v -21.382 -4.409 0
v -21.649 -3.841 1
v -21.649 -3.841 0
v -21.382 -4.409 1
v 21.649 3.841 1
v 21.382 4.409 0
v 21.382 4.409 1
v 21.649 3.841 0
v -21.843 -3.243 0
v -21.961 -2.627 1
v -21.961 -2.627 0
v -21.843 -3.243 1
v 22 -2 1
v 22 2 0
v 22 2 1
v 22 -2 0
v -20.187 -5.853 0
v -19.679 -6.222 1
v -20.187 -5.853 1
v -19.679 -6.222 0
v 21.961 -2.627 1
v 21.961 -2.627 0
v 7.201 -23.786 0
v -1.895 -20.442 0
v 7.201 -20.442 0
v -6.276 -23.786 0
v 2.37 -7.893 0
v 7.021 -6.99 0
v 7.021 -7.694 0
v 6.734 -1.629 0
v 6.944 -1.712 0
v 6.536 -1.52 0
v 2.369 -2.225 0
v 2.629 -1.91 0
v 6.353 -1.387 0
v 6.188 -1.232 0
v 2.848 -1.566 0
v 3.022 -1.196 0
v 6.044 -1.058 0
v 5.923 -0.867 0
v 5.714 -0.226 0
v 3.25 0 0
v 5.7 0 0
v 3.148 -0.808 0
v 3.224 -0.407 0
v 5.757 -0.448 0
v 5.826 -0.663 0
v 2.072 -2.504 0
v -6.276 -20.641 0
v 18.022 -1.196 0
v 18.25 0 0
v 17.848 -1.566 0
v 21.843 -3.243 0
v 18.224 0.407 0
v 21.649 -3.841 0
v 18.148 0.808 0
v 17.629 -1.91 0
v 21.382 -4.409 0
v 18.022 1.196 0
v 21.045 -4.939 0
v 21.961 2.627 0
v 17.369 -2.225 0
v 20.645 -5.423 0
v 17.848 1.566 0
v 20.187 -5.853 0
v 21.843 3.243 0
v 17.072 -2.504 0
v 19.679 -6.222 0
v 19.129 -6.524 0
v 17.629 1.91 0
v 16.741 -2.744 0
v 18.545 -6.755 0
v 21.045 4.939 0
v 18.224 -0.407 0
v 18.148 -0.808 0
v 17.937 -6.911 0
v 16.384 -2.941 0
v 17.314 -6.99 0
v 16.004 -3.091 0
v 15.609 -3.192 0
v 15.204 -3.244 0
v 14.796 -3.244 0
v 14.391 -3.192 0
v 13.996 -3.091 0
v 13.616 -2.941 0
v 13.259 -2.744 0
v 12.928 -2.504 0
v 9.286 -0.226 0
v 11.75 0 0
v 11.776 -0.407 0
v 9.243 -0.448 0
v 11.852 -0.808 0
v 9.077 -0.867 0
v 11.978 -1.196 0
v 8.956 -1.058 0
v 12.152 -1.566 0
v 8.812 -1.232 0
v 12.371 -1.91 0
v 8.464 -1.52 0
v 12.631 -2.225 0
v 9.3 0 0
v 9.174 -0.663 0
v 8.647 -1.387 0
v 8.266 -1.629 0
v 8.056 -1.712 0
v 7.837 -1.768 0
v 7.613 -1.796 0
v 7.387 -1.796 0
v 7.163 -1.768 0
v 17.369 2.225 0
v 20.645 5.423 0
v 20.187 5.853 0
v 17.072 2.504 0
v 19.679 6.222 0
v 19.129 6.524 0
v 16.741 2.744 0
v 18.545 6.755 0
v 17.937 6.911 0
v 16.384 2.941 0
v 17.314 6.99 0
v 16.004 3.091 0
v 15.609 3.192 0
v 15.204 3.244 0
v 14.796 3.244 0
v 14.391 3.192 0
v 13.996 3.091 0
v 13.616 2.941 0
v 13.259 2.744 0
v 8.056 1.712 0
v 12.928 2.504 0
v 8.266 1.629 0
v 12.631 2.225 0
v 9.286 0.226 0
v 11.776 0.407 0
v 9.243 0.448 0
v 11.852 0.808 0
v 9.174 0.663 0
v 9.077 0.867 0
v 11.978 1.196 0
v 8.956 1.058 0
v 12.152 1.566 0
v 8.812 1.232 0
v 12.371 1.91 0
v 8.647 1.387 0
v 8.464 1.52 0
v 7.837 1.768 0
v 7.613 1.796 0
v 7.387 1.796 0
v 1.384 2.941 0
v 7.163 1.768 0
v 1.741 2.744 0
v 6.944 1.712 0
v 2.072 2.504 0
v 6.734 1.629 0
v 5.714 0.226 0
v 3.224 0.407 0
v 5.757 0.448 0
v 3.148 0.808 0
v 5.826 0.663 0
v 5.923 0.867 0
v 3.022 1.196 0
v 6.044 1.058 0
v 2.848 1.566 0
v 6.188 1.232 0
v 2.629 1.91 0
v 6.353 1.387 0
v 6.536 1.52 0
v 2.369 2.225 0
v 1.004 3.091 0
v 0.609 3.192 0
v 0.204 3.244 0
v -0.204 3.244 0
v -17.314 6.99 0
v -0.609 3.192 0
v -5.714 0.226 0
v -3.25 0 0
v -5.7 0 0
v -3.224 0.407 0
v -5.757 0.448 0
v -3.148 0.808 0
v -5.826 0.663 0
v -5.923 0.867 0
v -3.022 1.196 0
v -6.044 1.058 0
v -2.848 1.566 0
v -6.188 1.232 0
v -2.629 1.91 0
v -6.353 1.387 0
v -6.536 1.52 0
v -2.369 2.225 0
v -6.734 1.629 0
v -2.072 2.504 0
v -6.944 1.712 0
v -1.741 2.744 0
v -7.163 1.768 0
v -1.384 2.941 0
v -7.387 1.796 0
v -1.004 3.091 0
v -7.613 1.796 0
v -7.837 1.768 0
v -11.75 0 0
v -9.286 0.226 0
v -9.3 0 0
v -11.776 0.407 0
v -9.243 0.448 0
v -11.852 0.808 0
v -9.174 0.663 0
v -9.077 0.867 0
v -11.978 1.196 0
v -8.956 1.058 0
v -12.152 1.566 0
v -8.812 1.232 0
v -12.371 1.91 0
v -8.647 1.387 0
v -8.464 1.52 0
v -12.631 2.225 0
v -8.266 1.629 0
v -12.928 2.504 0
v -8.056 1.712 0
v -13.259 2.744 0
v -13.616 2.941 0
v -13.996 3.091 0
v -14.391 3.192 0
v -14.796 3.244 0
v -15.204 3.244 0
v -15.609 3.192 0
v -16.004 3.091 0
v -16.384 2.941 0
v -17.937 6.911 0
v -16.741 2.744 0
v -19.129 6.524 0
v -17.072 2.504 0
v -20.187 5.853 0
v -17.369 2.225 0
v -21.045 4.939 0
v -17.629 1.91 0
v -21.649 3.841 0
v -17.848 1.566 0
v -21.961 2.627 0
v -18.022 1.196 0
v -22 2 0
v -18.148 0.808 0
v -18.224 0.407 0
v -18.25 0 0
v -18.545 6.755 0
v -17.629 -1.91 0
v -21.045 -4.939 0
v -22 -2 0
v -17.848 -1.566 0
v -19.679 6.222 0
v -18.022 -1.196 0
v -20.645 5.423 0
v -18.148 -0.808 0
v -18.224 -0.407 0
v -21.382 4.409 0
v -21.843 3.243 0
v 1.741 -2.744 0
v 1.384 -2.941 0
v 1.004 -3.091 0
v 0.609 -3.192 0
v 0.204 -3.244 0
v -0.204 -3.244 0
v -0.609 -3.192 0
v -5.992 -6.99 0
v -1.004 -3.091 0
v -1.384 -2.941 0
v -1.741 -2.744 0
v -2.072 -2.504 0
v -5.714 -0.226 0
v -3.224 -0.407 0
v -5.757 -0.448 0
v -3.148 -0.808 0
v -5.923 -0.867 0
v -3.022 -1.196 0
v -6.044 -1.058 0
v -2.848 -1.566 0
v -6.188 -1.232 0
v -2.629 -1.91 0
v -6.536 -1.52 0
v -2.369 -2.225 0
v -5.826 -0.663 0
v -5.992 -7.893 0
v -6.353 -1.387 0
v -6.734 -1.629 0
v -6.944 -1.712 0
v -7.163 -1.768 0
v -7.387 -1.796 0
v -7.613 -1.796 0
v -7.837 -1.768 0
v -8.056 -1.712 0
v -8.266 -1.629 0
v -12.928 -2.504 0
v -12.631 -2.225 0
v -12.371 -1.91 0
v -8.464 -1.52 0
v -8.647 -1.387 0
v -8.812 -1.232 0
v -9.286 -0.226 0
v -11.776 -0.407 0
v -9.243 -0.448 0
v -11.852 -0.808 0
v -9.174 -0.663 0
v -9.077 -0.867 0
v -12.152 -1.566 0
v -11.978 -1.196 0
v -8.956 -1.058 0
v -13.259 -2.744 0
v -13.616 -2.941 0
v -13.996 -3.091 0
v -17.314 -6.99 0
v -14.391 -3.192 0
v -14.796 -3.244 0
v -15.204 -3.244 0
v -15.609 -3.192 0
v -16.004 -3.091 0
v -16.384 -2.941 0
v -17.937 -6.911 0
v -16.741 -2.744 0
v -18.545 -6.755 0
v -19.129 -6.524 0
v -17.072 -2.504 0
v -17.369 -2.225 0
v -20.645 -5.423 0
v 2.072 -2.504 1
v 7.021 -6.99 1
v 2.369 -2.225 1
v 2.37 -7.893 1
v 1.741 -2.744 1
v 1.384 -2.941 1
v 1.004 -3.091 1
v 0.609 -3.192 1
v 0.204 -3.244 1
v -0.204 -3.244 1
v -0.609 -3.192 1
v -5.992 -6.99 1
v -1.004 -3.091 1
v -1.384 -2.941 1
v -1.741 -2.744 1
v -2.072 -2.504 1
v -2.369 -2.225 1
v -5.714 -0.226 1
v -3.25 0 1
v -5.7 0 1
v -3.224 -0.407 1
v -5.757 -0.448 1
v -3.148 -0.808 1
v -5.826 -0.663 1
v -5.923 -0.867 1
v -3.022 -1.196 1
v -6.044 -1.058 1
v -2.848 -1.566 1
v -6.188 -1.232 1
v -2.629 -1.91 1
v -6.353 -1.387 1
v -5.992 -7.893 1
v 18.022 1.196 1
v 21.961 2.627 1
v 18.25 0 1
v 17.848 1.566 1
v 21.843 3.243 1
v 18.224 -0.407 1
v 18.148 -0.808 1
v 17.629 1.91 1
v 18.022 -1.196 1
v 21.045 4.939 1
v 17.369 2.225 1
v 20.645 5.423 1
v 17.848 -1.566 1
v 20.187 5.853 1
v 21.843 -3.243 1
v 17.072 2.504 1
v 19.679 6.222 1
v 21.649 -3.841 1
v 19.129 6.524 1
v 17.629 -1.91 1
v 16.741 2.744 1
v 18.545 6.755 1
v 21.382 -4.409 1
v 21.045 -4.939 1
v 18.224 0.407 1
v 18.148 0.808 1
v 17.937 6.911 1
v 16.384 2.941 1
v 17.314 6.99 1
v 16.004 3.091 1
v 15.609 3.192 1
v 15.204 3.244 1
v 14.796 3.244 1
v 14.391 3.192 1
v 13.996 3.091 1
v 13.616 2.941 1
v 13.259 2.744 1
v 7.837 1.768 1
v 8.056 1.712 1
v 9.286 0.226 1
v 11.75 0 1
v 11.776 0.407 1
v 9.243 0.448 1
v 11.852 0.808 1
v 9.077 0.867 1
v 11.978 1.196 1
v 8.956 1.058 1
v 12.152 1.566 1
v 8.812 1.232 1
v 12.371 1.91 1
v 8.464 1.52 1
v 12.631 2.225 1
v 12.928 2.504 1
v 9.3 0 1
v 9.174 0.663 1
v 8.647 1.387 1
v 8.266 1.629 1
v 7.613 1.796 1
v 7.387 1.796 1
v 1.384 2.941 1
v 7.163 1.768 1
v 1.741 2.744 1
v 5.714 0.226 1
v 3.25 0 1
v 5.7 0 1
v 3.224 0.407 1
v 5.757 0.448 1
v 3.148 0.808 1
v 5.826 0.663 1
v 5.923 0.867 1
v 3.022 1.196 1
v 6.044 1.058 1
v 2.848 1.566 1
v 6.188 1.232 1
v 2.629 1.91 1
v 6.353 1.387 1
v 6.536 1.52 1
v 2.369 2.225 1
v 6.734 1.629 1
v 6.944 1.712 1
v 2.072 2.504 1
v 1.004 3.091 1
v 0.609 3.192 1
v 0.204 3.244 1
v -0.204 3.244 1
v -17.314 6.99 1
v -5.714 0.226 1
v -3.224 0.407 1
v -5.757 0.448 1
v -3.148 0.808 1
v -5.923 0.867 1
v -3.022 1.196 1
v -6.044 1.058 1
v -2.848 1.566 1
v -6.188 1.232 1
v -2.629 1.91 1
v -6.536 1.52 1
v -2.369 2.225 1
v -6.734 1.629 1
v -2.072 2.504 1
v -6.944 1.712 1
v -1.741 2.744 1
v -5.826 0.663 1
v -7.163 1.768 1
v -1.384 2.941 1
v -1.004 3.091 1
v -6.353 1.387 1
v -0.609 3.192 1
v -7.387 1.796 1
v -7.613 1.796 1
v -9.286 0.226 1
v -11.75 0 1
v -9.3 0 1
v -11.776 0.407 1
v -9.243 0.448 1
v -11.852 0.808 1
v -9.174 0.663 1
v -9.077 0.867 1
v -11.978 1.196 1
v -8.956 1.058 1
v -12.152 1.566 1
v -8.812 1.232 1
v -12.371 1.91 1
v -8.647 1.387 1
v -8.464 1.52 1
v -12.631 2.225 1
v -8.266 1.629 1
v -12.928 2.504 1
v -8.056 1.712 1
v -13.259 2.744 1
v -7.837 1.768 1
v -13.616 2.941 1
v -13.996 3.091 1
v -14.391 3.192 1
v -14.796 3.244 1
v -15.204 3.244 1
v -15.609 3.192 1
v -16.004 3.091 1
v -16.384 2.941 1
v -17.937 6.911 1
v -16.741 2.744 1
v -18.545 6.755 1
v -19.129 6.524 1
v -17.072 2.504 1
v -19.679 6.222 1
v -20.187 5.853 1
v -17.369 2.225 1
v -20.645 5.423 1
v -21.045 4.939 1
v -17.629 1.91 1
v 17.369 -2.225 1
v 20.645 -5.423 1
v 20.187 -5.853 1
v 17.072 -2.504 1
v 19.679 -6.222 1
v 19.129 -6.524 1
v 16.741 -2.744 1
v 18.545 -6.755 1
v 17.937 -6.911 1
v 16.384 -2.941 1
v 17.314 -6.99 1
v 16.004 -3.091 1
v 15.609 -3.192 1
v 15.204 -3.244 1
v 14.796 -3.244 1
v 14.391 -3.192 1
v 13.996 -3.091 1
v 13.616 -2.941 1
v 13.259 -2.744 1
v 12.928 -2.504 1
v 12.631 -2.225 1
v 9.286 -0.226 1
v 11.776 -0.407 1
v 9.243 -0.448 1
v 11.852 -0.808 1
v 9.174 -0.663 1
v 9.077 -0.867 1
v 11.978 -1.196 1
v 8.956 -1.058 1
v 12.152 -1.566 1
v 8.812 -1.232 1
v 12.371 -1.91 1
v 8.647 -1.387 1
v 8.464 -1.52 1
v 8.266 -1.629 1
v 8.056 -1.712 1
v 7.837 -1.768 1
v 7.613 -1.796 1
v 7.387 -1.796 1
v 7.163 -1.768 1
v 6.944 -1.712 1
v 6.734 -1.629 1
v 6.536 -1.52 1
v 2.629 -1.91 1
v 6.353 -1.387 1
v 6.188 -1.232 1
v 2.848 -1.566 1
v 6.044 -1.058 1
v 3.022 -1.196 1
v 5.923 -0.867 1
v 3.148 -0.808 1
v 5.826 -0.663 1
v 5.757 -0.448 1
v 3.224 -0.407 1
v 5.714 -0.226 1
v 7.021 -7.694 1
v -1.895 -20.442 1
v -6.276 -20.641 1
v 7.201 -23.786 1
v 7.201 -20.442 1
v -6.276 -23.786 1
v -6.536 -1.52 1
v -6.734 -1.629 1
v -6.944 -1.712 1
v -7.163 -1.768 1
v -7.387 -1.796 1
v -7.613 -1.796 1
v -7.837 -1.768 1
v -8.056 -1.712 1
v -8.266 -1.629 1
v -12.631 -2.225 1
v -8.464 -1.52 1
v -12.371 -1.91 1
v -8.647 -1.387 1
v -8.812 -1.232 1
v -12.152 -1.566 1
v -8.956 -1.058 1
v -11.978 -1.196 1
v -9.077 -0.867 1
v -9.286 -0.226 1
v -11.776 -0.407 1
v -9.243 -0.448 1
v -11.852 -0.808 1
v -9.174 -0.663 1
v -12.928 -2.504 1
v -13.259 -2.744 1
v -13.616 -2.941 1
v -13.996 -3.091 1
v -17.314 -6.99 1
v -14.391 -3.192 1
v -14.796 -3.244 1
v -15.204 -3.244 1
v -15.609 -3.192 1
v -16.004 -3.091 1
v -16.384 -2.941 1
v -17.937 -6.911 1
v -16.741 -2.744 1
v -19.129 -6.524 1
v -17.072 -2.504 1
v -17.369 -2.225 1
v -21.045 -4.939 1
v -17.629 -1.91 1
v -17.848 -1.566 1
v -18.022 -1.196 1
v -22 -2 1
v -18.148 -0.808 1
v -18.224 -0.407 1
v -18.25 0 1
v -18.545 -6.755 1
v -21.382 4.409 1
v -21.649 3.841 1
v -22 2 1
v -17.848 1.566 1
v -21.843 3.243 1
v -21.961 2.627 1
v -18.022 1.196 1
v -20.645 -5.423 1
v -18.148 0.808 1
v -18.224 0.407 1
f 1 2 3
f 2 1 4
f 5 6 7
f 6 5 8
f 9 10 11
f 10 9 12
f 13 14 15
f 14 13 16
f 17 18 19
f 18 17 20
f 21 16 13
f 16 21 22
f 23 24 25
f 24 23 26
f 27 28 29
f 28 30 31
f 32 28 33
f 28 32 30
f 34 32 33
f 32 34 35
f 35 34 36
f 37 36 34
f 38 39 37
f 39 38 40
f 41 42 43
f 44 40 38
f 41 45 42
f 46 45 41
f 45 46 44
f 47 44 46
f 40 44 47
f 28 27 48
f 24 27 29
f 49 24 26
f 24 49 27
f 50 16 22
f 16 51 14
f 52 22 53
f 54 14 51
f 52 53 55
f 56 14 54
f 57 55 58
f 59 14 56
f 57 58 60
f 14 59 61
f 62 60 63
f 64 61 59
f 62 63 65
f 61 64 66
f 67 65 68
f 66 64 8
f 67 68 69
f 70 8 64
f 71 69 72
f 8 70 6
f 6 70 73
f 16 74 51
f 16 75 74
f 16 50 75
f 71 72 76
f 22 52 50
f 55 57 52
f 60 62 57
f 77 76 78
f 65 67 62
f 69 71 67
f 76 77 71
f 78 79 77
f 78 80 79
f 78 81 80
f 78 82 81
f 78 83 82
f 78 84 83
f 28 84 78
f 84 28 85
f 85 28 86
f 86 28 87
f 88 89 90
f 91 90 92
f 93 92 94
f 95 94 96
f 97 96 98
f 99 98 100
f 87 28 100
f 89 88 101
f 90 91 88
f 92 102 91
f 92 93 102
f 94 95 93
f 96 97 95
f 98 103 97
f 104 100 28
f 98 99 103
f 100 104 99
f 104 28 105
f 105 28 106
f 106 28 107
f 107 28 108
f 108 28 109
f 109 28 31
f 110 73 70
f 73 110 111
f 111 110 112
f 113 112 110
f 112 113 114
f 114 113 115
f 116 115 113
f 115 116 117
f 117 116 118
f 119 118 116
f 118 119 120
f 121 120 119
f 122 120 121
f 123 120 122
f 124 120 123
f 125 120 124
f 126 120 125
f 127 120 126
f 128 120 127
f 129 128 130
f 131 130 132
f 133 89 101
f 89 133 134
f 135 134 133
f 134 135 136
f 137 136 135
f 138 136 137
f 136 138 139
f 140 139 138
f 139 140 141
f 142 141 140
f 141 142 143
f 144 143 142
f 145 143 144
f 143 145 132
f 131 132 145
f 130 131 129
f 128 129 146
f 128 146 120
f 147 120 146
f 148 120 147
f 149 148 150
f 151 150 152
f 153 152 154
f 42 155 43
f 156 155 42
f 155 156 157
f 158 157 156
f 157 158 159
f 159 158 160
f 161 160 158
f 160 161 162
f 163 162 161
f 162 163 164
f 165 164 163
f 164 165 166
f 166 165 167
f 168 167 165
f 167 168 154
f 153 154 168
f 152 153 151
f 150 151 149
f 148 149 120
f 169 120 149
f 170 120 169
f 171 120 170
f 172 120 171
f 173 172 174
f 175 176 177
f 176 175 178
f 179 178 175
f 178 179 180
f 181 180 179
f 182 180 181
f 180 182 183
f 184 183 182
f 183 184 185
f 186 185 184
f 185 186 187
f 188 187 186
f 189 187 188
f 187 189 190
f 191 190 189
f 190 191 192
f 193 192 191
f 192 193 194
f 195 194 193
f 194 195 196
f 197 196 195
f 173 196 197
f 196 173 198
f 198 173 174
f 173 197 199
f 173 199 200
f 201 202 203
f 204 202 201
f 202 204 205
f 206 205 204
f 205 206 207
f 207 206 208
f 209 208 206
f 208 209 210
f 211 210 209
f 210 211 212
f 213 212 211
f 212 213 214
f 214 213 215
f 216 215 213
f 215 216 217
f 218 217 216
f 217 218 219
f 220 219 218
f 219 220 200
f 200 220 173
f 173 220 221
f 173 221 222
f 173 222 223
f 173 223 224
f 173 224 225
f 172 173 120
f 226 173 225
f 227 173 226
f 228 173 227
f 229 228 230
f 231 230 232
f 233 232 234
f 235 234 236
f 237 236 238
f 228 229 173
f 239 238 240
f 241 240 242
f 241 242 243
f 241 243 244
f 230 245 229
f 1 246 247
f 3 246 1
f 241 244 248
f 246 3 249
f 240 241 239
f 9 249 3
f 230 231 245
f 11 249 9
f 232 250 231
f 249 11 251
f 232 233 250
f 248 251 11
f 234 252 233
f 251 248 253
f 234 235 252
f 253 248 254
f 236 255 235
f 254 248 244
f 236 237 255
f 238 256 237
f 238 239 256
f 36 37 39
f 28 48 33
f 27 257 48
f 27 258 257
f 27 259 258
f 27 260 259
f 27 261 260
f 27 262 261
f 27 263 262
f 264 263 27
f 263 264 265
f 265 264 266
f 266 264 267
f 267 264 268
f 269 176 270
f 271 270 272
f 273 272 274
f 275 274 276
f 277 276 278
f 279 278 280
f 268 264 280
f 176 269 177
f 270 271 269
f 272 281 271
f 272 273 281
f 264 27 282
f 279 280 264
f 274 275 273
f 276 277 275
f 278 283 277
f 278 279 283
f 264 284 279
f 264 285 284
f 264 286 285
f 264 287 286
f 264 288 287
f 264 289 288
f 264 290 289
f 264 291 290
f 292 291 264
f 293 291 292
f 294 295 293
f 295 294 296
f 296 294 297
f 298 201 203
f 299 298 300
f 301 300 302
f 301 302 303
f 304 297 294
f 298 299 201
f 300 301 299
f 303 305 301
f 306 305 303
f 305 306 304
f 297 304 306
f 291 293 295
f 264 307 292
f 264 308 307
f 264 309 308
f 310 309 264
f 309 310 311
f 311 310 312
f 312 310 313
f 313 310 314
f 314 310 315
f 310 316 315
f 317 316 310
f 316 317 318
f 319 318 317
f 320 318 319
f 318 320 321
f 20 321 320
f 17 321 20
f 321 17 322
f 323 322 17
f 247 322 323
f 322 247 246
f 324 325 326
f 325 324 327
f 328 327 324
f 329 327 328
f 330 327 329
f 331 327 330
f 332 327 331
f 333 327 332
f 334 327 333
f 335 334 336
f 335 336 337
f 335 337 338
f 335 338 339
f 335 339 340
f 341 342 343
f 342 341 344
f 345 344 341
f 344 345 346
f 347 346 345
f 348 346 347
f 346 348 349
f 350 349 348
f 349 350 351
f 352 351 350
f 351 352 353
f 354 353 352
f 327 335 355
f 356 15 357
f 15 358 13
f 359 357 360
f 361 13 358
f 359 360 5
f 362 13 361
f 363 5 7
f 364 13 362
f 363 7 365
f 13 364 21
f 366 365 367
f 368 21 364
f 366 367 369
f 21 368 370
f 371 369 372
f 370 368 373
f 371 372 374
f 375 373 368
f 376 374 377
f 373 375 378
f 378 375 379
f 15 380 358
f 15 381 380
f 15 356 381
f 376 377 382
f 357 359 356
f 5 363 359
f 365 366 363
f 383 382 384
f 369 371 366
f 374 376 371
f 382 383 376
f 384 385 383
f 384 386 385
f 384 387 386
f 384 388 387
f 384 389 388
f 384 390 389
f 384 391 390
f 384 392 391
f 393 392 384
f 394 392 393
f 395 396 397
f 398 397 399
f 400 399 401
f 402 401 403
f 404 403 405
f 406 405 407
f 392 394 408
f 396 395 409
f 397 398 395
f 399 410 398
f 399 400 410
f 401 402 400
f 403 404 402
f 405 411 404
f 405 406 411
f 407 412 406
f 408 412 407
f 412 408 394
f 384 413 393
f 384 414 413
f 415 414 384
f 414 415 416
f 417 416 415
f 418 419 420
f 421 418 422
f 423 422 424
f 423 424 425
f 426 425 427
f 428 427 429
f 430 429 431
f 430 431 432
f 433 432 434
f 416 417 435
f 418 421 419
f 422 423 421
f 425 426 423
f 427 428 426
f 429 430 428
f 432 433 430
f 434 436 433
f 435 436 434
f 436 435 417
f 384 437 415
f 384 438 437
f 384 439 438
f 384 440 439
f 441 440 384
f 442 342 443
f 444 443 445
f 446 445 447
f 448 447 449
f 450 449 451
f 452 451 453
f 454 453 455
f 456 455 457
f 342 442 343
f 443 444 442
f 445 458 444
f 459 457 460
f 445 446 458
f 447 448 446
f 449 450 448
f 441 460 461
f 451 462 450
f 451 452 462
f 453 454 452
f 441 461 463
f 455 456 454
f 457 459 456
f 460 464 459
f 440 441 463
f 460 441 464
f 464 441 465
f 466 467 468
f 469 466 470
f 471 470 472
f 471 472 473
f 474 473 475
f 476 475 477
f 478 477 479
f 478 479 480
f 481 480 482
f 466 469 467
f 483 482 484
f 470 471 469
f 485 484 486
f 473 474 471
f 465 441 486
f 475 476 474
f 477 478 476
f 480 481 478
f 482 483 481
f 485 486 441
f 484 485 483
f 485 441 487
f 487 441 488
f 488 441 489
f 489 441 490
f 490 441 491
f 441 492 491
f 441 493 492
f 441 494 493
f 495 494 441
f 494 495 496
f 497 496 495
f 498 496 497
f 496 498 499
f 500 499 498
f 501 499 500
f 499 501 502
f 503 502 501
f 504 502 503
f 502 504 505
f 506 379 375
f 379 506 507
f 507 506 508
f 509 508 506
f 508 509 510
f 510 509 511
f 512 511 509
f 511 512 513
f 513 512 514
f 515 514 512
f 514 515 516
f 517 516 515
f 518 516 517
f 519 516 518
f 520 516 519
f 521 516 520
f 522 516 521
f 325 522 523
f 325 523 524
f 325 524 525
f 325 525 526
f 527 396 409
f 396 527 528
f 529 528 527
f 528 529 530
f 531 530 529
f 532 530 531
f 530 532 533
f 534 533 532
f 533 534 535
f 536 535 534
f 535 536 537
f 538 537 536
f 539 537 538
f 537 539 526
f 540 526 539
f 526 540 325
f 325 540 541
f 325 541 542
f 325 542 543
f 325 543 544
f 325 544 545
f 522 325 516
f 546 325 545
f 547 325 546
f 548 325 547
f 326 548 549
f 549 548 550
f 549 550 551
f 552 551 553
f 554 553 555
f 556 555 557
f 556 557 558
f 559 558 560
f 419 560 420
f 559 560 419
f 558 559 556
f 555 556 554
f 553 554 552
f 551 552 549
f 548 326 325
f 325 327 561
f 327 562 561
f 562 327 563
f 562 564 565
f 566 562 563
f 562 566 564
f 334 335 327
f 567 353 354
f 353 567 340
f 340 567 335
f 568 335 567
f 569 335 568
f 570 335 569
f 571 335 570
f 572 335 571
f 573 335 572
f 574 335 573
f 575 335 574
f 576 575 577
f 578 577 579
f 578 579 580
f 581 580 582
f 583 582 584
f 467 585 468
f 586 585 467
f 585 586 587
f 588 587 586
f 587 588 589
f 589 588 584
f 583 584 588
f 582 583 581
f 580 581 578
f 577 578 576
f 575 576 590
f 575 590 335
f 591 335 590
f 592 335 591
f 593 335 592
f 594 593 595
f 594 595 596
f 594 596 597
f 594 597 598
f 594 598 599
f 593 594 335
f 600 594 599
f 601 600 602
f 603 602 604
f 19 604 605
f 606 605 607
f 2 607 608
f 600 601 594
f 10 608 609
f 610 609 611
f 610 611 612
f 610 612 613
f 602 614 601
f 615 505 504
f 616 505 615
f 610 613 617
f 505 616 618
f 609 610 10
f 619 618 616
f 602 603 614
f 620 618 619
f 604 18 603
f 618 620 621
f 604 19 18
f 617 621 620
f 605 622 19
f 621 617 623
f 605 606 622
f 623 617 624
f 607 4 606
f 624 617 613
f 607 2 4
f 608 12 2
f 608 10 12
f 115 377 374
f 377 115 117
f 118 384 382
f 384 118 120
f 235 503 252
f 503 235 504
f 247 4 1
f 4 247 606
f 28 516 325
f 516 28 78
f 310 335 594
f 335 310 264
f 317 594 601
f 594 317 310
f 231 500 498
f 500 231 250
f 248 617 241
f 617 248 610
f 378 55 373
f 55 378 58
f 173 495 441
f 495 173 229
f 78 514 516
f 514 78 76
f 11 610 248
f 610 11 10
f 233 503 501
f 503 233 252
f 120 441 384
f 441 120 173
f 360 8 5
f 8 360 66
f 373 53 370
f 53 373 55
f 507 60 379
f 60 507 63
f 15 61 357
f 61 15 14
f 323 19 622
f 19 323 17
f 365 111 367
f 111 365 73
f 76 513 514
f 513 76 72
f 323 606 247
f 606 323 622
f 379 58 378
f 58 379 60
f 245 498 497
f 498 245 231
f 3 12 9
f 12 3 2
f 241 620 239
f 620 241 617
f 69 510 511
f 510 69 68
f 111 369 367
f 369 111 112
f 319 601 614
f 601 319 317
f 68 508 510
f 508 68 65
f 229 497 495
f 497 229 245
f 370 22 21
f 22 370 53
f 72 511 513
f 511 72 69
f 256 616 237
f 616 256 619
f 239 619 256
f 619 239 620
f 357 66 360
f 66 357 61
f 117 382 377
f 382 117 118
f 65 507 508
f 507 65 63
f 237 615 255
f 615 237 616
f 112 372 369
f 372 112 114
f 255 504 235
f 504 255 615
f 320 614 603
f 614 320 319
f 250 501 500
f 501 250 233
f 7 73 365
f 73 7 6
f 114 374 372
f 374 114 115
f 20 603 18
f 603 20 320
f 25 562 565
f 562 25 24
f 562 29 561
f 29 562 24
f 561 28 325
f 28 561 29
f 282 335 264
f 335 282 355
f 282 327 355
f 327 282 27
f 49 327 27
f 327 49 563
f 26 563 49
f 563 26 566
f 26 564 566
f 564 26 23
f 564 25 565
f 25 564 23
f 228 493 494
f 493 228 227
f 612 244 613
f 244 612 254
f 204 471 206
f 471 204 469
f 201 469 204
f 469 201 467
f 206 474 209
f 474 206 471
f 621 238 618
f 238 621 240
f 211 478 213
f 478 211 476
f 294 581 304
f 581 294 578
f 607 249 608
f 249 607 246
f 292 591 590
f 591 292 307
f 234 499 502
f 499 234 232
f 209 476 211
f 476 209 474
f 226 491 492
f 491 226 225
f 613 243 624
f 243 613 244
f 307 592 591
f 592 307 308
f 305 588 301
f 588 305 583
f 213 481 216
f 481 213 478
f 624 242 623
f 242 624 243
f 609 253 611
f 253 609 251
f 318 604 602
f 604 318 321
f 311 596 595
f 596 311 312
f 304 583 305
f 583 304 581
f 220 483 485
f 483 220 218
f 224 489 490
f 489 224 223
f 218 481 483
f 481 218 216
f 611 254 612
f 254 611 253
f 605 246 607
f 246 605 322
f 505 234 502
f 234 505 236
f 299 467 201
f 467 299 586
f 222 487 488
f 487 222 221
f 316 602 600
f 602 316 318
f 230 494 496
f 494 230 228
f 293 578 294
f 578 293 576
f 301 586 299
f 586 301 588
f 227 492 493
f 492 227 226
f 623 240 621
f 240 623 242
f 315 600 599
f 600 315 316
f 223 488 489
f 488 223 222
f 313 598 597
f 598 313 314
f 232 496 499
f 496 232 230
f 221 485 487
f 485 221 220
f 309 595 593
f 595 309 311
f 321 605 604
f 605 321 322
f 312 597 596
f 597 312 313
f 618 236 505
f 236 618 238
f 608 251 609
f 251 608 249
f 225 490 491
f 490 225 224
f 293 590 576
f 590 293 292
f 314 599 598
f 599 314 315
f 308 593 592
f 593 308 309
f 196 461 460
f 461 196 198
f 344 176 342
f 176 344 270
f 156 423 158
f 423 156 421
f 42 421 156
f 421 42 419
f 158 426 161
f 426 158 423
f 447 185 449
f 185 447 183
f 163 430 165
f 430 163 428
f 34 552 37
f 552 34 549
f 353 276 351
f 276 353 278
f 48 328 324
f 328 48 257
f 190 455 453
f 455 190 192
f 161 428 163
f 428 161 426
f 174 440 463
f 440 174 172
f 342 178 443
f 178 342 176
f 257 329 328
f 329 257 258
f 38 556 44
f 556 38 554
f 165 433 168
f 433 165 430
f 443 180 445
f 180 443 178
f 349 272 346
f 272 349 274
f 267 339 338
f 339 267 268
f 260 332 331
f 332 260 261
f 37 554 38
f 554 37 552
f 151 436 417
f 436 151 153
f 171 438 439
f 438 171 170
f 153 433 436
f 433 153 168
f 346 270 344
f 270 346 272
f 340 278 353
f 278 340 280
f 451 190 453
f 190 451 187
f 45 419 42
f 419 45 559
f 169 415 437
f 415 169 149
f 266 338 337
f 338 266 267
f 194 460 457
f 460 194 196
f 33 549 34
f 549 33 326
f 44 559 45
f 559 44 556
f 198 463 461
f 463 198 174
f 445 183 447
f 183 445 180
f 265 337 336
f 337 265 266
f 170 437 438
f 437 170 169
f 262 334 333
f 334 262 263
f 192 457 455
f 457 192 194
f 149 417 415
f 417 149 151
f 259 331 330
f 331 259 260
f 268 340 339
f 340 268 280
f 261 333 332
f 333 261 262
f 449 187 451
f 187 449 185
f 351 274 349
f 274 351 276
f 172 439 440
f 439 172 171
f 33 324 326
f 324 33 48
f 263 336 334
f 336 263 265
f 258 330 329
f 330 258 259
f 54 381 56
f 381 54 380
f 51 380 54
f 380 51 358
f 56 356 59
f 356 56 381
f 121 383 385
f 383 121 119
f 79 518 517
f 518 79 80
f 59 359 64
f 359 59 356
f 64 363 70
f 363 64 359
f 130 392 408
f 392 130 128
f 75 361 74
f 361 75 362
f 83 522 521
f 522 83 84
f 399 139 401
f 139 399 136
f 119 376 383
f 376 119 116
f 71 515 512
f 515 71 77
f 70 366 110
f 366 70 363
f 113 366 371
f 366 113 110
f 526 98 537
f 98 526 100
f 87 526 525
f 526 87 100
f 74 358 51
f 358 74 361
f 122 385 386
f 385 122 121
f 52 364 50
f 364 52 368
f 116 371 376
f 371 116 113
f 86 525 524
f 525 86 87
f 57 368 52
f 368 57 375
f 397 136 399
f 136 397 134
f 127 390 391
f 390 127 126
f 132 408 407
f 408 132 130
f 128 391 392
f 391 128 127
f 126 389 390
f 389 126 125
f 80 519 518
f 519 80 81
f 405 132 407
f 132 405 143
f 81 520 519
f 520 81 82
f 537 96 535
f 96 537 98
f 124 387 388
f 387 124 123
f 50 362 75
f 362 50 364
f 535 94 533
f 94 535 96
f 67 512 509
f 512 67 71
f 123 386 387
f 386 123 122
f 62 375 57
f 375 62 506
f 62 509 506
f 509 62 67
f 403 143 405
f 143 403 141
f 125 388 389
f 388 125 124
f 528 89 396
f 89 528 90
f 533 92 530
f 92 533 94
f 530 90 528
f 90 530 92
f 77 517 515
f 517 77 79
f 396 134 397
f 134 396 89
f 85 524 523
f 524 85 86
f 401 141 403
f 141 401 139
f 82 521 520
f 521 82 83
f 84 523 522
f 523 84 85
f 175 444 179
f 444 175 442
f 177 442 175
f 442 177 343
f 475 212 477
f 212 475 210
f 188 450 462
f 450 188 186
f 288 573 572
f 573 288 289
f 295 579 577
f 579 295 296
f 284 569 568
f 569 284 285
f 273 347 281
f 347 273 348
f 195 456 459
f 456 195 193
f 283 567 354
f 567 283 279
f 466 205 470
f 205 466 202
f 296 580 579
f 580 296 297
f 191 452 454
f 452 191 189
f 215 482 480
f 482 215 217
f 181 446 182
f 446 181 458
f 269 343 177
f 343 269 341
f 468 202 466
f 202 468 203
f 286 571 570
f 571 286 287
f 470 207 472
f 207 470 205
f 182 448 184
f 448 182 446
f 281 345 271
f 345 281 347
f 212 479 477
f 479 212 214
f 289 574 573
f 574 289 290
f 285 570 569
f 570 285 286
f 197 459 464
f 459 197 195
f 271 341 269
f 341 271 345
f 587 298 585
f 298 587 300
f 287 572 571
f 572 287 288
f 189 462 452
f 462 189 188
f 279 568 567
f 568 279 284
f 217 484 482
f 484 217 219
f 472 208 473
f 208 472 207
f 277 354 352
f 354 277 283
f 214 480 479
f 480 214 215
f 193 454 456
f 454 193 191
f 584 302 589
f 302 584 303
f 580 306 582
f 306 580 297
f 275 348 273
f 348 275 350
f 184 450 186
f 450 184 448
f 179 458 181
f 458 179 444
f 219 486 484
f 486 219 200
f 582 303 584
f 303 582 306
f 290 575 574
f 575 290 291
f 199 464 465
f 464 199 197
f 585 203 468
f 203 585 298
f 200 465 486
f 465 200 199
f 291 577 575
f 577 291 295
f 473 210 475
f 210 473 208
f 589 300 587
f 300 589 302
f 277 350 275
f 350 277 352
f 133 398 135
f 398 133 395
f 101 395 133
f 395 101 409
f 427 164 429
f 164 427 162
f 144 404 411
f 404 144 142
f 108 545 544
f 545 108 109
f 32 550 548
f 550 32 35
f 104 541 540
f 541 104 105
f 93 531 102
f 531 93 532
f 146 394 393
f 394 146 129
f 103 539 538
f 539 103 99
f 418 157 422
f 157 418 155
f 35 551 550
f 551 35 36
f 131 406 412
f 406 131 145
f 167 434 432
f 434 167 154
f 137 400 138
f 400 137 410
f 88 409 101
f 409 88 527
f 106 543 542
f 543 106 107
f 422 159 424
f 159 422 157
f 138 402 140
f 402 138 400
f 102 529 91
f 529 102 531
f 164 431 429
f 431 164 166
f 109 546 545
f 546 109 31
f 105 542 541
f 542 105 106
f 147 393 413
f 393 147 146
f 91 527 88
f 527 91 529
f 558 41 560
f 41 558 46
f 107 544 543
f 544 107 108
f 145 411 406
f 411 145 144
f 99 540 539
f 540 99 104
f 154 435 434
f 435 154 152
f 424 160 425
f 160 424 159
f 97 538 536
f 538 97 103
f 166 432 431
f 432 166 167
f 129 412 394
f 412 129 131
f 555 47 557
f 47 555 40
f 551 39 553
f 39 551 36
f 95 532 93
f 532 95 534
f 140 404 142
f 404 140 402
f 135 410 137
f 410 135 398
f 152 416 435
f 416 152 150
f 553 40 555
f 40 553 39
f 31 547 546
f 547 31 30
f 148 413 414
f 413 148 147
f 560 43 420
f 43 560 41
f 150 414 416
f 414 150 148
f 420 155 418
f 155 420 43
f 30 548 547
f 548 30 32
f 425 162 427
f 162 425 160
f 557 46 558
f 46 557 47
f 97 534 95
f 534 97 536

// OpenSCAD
$fn = 50;


difference() {
	union() {
		*color(alpha = 1.0000000000, c = "gray") {
			translate(v = [0, 14, 0]) {
				linear_extrude(height = 1) {
					text(font = "Arial:style=Bold", halign = "center", size = 4.5000000000, text = "COMMENT description oobb_plate_shape_p_type_1_depth_3_width_1_thickness_z_extra_oobb_size", valign = "center");
				}
			}
		}
		hull() {
			translate(v = [-17.0000000000, 2.0000000000, 0]) {
				cylinder(h = 1, r = 5);
			}
			translate(v = [17.0000000000, 2.0000000000, 0]) {
				cylinder(h = 1, r = 5);
			}
			translate(v = [-17.0000000000, -2.0000000000, 0]) {
				cylinder(h = 1, r = 5);
			}
			translate(v = [17.0000000000, -2.0000000000, 0]) {
				cylinder(h = 1, r = 5);
			}
		}
		translate(v = [0, -5, 0]) {
			linear_extrude(height = 1) {
				text(font = "DejaVu Sans Mono:style=Bold", halign = "center", size = 19.0000000000, text = "Z", valign = "top");
			}
		}
	}
	union() {
		*color(alpha = 1.0000000000, c = "gray") {
			translate(v = [0, 14, 0]) {
				linear_extrude(height = 1) {
					text(font = "Arial:style=Bold", halign = "center", size = 4.5000000000, text = "COMMENT description oobb_holes_shape_n_type_3_width_1_thickness_z_extra_oobb_size_1_height_'all'_holes_true_both_holes", valign = "center");
				}
			}
		}
		translate(v = [-15.0000000000, 0.0000000000, 0]) {
			translate(v = [0, 0, -50]) {
				cylinder(h = 100, r = 3.2500000000);
			}
		}
		translate(v = [0, 0, -50]) {
			cylinder(h = 100, r = 3.2500000000);
		}
		translate(v = [15.0000000000, 0.0000000000, 0]) {
			translate(v = [0, 0, -50]) {
				cylinder(h = 100, r = 3.2500000000);
			}
		}
		translate(v = [-15.0000000000, 0.0000000000, 0]) {
			translate(v = [0, 0, -50]) {
				cylinder(h = 100, r = 1.8000000000);
			}
		}
		translate(v = [-7.5000000000, 0.0000000000, 0]) {
			translate(v = [0, 0, -50]) {
				cylinder(h = 100, r = 1.8000000000);
			}
		}
		translate(v = [0, 0, -50]) {
			cylinder(h = 100, r = 1.8000000000);
		}
		translate(v = [7.5000000000, 0.0000000000, 0]) {
			translate(v = [0, 0, -50]) {
				cylinder(h = 100, r = 1.8000000000);
			}
		}
		translate(v = [15.0000000000, 0.0000000000, 0]) {
			translate(v = [0, 0, -50]) {
				cylinder(h = 100, r = 1.8000000000);
			}
		}
	}
}
